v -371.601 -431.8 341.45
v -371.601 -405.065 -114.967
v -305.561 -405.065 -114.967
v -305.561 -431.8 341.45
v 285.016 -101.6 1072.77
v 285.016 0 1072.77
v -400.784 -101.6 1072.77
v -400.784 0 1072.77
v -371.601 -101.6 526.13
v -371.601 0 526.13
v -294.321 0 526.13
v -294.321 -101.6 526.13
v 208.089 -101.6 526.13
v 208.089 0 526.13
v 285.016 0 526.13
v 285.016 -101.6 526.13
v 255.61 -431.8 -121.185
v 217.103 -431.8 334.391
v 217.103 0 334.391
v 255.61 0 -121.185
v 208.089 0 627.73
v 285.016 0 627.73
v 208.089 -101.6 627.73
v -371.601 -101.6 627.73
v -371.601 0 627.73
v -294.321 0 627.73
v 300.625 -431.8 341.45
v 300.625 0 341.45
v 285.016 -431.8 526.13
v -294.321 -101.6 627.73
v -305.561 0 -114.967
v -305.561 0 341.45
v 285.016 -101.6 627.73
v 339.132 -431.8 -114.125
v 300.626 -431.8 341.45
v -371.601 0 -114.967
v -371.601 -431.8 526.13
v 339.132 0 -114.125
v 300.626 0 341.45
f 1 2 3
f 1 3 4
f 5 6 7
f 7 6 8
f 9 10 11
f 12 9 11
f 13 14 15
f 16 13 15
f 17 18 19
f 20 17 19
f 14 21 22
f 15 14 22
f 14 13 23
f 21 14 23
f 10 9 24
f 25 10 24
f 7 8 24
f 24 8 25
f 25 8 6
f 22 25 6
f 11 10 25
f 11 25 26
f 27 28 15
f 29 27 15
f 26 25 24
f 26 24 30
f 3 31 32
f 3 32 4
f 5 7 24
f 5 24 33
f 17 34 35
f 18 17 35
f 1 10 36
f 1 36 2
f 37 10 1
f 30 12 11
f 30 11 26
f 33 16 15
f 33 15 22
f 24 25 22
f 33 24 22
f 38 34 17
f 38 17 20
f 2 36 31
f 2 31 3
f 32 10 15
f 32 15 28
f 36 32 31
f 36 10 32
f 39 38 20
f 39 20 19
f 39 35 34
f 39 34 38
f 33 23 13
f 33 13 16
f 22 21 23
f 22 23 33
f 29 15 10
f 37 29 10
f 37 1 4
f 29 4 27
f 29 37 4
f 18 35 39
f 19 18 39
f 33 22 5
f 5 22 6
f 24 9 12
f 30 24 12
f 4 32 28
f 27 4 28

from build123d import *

# Parameters (mm, degrees)
F1_DEPTH = 431.8
F0_W     = 77.280167
F0_H     = 101.6
F0_W_2   = 76.92717
F2_DEPTH = 101.6
F3_DEPTH = 101.6
F5_DEPTH = 66.04
F6_W     = 431.8
F6_H     = 457.2
F7_DEPTH = 83.82


with BuildPart() as f1:
    # F0 (on Front) → F1 (new body)
    with BuildSketch(Plane.XZ):
        Polygon((-294.320971, 526.129933), (-371.601138, 526.129933), (-371.601138, 341.450363), (300.625473, 341.450363), (285.015881, 526.129933), (208.088711, 526.129933), align=None)
    extrude(amount=F1_DEPTH)

    # F4 (on face) → F5 (join)
    with BuildSketch(Plane(origin=(-371.601138, 0, 0), x_dir=(0, -1, 0), z_dir=(-1, 0, 0))):
        Polygon((431.8, 341.450363), (0, 341.450363), (0, -114.967306), (405.065168, -114.967306), align=None)
    extrude(amount=-F5_DEPTH)


with BuildPart() as f2:
    # F0 (on Front) → F2 (new body)
    with BuildSketch(Plane.XZ):
        with Locations((-332.961054, 576.929933)):
            Rectangle(F0_W, F0_H)
        with Locations((246.552296, 576.929933)):
            Rectangle(F0_W_2, F0_H)
    extrude(amount=F2_DEPTH)


with BuildPart() as f3:
    # F0 (on Front) → F3 (new body)
    with BuildSketch(Plane.XZ):
        Polygon((-400.784119, 1072.770325), (-371.601138, 627.729933), (-294.320971, 627.729933), (208.088711, 627.729933), (285.015881, 627.729933), (285.015881, 1072.770325), align=None)
    extrude(amount=F3_DEPTH)


with BuildPart() as f7:
    # F6 (on face) → F7 (new body)
    with BuildSketch(Plane(origin=(327.148566, 0, 27.651439), x_dir=(0, 1, 0), z_dir=(0.996447, 0, 0.084222))):
        with Locations((-215.9, 86.31783)):
            Rectangle(F6_W, F6_H)
    extrude(amount=-F7_DEPTH)


solid = Compound([f1.part, f2.part, f3.part, f7.part])
